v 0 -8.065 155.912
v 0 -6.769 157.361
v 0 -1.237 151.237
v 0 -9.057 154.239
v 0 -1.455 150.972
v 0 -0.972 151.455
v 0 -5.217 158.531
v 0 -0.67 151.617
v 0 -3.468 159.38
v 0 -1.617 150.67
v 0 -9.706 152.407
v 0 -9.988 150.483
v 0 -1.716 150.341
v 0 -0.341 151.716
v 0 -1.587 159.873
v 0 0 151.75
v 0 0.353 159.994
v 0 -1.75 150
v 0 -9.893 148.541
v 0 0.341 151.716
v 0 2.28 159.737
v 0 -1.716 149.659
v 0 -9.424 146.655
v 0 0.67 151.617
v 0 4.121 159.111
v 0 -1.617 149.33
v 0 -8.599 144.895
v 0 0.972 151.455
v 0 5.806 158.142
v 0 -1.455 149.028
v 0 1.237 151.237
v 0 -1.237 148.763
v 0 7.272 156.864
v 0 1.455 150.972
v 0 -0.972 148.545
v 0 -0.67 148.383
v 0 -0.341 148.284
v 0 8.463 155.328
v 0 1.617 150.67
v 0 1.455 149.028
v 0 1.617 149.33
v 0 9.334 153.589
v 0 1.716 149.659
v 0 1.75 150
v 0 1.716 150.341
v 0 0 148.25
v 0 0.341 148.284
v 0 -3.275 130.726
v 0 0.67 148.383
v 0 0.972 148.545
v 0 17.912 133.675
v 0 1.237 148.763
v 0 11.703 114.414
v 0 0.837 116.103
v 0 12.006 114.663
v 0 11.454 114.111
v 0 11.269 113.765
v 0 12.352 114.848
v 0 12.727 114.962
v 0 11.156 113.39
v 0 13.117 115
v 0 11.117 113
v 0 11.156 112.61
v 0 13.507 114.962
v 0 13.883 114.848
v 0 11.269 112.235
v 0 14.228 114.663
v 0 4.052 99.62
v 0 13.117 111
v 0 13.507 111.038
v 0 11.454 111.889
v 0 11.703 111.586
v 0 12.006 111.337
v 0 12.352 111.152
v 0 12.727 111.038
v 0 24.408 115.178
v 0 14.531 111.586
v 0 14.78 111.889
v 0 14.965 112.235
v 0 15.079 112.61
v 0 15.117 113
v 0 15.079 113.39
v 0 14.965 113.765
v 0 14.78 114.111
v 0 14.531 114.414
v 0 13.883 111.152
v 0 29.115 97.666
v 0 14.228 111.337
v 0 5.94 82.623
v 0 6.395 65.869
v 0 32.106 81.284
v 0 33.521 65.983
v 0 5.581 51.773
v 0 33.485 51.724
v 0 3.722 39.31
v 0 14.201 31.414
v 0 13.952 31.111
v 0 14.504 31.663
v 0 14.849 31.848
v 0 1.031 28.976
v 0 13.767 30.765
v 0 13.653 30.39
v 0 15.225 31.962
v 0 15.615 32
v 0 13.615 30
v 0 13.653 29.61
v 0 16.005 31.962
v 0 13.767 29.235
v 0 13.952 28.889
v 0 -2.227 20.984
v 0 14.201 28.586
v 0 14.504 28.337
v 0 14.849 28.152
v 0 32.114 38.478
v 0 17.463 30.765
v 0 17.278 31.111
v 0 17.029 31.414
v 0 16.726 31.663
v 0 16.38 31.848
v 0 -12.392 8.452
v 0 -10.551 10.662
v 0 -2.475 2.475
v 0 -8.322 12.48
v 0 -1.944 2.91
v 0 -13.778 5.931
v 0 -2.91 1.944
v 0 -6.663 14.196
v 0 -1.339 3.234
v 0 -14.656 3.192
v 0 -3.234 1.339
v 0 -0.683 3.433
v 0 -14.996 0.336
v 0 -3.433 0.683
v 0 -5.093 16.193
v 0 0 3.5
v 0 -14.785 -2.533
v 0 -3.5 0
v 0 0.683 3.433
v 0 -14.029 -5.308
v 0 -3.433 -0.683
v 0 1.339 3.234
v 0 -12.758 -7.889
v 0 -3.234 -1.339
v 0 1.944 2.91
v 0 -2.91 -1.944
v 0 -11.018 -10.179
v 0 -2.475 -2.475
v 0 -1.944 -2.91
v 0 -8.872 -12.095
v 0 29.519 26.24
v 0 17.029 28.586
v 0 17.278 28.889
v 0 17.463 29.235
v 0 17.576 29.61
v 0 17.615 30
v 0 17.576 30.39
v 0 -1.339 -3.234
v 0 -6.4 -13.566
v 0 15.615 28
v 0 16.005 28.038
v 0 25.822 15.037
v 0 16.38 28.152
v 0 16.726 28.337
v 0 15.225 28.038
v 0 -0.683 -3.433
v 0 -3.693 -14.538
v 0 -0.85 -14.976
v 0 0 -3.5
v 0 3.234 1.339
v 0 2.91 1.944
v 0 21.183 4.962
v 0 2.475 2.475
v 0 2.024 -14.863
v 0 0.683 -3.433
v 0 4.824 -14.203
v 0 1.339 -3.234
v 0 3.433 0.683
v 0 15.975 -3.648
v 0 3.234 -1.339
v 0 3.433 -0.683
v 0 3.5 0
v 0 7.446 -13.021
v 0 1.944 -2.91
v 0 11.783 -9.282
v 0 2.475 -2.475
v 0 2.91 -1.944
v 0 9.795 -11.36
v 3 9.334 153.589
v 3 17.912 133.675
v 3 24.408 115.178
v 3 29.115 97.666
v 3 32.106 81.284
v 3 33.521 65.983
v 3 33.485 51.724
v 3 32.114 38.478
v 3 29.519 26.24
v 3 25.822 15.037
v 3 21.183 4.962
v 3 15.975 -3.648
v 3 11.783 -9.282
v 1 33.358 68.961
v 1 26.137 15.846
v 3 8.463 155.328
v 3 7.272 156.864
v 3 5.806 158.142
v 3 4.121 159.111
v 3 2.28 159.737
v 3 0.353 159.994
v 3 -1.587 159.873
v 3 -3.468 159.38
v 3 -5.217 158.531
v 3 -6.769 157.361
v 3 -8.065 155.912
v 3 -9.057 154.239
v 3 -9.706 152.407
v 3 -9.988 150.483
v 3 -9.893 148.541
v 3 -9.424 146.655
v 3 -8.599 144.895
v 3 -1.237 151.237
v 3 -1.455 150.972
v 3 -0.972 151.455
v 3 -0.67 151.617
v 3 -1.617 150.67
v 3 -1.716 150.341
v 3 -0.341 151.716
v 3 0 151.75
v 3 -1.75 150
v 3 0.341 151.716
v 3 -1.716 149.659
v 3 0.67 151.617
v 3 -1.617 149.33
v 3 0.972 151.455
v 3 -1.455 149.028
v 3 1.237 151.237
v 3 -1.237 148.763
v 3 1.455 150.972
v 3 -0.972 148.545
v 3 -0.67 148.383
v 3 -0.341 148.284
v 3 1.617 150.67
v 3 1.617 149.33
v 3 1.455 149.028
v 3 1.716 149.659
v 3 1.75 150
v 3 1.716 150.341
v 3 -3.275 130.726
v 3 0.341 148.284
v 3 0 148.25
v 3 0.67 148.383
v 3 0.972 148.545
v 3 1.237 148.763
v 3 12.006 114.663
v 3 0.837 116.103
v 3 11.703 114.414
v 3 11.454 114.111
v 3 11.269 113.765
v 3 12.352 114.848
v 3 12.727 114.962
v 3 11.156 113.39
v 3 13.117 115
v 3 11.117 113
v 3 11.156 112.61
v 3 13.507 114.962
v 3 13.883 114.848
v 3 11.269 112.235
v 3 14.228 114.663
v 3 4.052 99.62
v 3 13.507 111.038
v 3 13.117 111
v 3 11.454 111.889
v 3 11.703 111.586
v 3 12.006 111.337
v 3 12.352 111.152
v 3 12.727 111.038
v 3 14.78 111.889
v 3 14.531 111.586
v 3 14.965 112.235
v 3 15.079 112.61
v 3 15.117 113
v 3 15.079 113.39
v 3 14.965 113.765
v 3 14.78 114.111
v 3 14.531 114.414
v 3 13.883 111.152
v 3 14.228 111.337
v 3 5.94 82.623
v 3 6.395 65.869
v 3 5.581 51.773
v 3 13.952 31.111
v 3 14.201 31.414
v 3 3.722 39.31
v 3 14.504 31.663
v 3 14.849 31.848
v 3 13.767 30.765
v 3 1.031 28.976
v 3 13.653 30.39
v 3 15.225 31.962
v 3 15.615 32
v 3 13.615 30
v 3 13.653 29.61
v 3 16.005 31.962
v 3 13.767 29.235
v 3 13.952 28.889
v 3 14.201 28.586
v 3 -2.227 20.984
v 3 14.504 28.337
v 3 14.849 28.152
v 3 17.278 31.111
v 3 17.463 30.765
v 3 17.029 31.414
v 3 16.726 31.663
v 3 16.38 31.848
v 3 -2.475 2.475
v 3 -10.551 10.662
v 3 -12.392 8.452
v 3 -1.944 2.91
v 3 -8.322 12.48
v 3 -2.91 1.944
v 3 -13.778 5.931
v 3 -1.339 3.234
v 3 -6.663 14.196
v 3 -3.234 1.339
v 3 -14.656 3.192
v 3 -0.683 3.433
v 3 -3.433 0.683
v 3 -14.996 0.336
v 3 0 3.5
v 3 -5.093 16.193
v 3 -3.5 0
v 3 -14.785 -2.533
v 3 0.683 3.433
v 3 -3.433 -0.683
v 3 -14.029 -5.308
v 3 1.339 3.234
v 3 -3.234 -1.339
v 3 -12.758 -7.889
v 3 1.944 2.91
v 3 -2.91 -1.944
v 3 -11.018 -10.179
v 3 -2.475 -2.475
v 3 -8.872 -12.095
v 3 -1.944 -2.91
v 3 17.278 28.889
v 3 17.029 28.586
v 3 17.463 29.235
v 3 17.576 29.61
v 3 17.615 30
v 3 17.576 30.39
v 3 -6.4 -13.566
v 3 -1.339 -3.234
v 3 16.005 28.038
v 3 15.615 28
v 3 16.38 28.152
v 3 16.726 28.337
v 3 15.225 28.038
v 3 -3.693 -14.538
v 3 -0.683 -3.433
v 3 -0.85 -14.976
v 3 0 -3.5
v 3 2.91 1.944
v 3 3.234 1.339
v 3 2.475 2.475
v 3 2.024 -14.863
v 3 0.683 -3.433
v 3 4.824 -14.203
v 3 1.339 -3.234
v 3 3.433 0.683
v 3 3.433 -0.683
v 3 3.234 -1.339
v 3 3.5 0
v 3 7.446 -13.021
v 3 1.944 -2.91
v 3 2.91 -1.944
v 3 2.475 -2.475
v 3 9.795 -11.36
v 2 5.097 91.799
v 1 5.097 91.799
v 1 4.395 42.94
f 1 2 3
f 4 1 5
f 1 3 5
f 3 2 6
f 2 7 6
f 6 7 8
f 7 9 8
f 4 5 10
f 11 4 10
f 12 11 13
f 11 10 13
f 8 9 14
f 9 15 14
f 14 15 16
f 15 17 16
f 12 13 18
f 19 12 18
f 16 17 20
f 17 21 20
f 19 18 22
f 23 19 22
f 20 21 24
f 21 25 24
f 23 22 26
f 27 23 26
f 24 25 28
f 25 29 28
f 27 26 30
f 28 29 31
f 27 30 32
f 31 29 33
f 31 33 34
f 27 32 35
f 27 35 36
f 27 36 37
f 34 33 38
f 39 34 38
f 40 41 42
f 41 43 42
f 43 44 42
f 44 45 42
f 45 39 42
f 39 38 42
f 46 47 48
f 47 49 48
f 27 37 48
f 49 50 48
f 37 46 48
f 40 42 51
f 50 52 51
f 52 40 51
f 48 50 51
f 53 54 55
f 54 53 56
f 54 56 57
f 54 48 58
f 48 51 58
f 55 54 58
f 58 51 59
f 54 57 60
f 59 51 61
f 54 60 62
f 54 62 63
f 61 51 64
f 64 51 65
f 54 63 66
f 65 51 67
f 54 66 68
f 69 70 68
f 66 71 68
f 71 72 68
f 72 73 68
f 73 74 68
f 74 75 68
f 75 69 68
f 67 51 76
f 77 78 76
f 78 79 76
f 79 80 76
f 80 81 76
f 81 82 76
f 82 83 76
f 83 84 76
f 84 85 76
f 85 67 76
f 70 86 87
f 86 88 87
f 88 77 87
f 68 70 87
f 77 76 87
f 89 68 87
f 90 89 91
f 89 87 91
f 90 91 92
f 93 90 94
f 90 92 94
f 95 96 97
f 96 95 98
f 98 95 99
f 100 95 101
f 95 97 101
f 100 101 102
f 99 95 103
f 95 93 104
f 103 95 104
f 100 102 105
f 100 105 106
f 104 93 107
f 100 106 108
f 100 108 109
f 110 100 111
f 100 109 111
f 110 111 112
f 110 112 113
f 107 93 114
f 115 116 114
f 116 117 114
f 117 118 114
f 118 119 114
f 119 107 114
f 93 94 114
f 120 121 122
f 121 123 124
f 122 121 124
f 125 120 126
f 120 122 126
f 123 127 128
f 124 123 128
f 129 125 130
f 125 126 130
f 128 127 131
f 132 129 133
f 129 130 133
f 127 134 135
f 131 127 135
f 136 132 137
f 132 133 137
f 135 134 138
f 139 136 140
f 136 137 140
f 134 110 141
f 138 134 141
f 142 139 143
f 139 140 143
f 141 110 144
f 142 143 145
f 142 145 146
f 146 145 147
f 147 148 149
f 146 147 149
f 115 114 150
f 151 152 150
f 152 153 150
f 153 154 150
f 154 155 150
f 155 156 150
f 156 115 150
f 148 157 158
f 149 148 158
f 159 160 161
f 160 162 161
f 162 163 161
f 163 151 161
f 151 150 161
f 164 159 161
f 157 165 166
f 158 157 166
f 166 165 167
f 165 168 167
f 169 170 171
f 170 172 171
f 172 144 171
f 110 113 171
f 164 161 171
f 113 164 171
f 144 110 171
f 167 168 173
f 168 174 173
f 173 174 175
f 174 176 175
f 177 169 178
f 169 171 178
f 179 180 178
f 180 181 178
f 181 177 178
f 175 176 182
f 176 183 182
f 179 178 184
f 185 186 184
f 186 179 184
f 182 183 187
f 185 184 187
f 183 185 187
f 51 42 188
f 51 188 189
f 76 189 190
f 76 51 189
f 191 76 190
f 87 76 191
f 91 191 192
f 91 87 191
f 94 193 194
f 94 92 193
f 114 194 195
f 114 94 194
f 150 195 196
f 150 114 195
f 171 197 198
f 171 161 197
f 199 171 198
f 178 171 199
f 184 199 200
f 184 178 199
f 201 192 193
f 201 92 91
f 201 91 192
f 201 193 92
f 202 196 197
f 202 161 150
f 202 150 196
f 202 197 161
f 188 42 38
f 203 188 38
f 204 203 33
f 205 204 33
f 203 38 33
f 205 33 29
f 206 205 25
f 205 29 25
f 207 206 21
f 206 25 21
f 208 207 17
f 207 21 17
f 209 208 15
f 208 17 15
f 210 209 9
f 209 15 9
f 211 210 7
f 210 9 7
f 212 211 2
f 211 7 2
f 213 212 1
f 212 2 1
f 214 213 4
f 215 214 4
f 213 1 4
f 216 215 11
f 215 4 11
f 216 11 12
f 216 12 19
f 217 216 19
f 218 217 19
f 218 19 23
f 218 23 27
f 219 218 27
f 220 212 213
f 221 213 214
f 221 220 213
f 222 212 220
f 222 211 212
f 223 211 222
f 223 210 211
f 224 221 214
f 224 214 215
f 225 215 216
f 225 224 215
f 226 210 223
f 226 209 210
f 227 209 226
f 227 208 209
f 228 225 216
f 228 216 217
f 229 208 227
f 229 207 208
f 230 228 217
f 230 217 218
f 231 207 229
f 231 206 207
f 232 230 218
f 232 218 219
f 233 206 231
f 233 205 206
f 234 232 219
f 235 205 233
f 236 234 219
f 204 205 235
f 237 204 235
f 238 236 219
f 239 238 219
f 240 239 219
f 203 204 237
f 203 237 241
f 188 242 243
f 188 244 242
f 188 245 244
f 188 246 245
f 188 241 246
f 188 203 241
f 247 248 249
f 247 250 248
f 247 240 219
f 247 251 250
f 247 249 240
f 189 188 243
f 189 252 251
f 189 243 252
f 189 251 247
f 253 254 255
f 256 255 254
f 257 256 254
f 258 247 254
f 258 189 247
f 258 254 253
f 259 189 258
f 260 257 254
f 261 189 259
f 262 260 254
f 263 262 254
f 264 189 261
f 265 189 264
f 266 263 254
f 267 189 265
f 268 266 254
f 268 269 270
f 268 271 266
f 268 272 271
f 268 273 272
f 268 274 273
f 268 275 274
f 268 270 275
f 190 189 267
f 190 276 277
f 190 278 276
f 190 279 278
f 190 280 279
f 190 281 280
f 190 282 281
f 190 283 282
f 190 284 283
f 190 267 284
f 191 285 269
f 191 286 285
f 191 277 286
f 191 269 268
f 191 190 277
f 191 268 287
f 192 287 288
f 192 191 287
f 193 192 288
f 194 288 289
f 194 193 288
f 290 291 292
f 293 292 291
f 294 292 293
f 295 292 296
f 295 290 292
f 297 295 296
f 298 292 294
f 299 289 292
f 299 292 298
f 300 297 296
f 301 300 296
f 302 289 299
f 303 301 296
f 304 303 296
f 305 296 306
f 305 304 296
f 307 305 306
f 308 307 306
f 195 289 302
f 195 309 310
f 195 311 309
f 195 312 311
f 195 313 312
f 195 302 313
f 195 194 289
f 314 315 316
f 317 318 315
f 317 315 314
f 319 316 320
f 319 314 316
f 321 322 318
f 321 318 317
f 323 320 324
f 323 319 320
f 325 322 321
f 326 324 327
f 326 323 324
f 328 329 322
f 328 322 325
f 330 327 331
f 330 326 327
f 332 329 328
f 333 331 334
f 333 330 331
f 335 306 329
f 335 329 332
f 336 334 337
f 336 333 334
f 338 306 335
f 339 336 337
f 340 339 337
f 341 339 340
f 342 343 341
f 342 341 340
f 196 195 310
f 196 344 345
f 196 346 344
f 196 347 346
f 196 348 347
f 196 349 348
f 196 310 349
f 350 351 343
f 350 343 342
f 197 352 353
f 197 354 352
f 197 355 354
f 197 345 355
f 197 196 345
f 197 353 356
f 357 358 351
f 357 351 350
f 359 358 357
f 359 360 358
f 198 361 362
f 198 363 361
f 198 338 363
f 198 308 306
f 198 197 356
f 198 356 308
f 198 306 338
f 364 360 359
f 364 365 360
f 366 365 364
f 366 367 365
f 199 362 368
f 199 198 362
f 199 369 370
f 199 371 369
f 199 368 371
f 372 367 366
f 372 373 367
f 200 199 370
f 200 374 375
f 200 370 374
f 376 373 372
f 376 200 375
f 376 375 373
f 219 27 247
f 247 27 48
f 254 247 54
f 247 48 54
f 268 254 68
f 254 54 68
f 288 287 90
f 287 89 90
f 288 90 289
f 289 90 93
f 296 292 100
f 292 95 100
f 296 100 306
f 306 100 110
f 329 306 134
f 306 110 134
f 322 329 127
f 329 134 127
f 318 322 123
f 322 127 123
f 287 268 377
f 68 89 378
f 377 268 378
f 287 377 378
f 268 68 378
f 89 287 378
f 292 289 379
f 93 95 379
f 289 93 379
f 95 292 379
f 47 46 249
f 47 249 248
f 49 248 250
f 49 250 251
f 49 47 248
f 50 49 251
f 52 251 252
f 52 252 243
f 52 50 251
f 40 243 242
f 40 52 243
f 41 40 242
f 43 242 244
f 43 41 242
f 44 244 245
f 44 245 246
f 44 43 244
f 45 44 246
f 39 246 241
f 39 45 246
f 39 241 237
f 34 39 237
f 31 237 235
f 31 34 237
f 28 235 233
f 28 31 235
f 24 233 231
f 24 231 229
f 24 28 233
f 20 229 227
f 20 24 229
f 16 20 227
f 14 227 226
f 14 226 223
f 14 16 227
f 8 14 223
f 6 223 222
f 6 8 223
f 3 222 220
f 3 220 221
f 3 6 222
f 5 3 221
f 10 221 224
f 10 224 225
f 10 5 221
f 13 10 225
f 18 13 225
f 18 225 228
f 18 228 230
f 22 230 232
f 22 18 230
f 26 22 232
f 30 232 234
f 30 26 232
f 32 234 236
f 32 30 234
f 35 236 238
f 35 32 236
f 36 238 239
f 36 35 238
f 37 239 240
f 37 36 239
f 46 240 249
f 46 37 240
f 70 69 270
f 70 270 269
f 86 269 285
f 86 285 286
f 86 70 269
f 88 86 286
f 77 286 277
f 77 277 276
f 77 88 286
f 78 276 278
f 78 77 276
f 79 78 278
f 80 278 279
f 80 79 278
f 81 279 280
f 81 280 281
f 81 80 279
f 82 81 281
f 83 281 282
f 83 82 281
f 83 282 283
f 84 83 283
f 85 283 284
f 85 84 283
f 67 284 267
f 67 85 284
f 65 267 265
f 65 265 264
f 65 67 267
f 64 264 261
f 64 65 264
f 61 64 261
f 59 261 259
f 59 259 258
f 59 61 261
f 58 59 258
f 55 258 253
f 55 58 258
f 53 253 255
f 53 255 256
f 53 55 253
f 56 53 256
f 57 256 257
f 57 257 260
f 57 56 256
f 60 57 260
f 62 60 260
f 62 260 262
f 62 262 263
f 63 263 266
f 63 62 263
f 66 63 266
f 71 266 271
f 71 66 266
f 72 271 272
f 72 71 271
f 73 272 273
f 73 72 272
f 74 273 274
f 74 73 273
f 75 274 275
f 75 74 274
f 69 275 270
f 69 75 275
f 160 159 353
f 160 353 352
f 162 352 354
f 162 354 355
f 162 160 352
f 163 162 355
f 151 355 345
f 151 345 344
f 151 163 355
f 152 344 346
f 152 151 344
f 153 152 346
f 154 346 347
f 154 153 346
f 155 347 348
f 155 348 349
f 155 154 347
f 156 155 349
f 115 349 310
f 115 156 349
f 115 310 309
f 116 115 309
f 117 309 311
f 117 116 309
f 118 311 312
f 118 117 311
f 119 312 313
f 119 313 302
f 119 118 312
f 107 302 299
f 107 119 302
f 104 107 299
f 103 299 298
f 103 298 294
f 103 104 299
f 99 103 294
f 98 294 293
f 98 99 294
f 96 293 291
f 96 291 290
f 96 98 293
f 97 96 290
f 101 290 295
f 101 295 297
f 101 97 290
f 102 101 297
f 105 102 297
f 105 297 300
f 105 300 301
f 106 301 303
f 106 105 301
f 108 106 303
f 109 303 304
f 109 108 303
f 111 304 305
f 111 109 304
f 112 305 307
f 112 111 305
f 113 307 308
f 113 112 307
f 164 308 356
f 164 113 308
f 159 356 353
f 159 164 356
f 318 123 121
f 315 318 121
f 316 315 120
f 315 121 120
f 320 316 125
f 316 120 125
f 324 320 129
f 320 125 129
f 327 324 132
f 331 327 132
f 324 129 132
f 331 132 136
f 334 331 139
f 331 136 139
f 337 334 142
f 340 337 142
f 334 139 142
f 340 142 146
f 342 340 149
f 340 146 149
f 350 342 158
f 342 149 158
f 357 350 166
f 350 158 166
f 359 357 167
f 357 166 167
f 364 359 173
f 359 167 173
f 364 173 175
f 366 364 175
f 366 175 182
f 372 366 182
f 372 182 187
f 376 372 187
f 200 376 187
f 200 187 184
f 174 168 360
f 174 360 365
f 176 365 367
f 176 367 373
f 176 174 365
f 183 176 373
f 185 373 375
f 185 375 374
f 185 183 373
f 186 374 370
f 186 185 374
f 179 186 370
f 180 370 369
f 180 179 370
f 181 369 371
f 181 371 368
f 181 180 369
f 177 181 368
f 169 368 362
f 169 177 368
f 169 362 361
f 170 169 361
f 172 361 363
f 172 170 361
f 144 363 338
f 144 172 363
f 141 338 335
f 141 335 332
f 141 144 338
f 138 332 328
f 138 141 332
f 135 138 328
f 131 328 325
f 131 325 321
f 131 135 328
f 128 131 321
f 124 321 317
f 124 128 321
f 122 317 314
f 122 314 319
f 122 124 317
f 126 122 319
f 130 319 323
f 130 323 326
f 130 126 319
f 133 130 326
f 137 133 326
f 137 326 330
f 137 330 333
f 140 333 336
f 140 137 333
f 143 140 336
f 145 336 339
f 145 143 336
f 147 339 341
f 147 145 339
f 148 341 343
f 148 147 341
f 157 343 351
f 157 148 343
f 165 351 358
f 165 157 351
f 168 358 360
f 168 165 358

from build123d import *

# Parameters (mm, degrees)
CROQUIS1_R              = 1.75
CROQUIS1_R_2            = 3.5
CROQUIS1_R_3            = 2
SALIENTE_EXTRUIR1_DEPTH = 3


with BuildPart() as part:
    # Croquis1 → Saliente-Extruir1 (new body)
    with BuildSketch(Plane(origin=(0, 0, 0), x_dir=(0, 0, -1), z_dir=(1, 0, 0))):
        with BuildLine():
            ThreePointArc((-12.479760771, -8.321993217), (10.178991806, -11.017627957), (9.281950646, 11.783267467))
            add(Edge.make_bspline(
                [(-153.589400871, 9.333606023), (-52.027464553, 57.017454048), (-3.028685523, 21.666117386), (9.281950646, 11.783267467)],
                knots=[0, 0, 0, 0, 1, 1, 1, 1], degree=3))
            ThreePointArc((-153.589400871, 9.333606023), (-158.998047864, -4.362927301), (-144.894564169, -8.598518767))
            add(Edge.make_bspline(
                [(-144.894564169, -8.598518767), (-94.399563679, 13.089335746), (-29.021790265, 9.608207487), (-12.479760771, -8.321993217)],
                knots=[0, 0, 0, 0, 1, 1, 1, 1], degree=3))
        make_face()
        with Locations((-150, 0)):
            Circle(CROQUIS1_R, mode=Mode.SUBTRACT)
        Circle(CROQUIS1_R_2, mode=Mode.SUBTRACT)
        with Locations((-113, 13.11718)):
            Circle(CROQUIS1_R_3, mode=Mode.SUBTRACT)
        with Locations((-30, 15.614781046)):
            Circle(CROQUIS1_R_3, mode=Mode.SUBTRACT)
    extrude(amount=SALIENTE_EXTRUIR1_DEPTH)


solid = part.part
